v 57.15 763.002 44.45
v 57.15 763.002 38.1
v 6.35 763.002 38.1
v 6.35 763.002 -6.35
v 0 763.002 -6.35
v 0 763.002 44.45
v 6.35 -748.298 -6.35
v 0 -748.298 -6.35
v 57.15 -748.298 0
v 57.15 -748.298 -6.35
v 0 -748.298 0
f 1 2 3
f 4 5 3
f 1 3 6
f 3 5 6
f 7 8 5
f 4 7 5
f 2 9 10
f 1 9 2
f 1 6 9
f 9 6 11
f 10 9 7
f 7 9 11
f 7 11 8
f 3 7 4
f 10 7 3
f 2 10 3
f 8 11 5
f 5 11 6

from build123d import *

# Parameters (mm, degrees)
F1_DEPTH = 6.35
F3_DEPTH = 50.8


with BuildPart() as f1:
    # F0 (on Right) → F1 (new body)
    with BuildSketch(Plane.YZ):
        Polygon((-748.298248, -6.35), (763.001752, -6.35), (763.001752, 44.45), (-748.298248, 0), align=None)
    extrude(amount=F1_DEPTH)

    # F2 (on face) → F3 (join)
    with BuildSketch(Plane.YZ.offset(6.35)):
        Polygon((-748.298248, -6.35), (763.001752, 38.1), (763.001752, 44.45), (-748.298248, 0), align=None)
    extrude(amount=F3_DEPTH)


solid = f1.part
